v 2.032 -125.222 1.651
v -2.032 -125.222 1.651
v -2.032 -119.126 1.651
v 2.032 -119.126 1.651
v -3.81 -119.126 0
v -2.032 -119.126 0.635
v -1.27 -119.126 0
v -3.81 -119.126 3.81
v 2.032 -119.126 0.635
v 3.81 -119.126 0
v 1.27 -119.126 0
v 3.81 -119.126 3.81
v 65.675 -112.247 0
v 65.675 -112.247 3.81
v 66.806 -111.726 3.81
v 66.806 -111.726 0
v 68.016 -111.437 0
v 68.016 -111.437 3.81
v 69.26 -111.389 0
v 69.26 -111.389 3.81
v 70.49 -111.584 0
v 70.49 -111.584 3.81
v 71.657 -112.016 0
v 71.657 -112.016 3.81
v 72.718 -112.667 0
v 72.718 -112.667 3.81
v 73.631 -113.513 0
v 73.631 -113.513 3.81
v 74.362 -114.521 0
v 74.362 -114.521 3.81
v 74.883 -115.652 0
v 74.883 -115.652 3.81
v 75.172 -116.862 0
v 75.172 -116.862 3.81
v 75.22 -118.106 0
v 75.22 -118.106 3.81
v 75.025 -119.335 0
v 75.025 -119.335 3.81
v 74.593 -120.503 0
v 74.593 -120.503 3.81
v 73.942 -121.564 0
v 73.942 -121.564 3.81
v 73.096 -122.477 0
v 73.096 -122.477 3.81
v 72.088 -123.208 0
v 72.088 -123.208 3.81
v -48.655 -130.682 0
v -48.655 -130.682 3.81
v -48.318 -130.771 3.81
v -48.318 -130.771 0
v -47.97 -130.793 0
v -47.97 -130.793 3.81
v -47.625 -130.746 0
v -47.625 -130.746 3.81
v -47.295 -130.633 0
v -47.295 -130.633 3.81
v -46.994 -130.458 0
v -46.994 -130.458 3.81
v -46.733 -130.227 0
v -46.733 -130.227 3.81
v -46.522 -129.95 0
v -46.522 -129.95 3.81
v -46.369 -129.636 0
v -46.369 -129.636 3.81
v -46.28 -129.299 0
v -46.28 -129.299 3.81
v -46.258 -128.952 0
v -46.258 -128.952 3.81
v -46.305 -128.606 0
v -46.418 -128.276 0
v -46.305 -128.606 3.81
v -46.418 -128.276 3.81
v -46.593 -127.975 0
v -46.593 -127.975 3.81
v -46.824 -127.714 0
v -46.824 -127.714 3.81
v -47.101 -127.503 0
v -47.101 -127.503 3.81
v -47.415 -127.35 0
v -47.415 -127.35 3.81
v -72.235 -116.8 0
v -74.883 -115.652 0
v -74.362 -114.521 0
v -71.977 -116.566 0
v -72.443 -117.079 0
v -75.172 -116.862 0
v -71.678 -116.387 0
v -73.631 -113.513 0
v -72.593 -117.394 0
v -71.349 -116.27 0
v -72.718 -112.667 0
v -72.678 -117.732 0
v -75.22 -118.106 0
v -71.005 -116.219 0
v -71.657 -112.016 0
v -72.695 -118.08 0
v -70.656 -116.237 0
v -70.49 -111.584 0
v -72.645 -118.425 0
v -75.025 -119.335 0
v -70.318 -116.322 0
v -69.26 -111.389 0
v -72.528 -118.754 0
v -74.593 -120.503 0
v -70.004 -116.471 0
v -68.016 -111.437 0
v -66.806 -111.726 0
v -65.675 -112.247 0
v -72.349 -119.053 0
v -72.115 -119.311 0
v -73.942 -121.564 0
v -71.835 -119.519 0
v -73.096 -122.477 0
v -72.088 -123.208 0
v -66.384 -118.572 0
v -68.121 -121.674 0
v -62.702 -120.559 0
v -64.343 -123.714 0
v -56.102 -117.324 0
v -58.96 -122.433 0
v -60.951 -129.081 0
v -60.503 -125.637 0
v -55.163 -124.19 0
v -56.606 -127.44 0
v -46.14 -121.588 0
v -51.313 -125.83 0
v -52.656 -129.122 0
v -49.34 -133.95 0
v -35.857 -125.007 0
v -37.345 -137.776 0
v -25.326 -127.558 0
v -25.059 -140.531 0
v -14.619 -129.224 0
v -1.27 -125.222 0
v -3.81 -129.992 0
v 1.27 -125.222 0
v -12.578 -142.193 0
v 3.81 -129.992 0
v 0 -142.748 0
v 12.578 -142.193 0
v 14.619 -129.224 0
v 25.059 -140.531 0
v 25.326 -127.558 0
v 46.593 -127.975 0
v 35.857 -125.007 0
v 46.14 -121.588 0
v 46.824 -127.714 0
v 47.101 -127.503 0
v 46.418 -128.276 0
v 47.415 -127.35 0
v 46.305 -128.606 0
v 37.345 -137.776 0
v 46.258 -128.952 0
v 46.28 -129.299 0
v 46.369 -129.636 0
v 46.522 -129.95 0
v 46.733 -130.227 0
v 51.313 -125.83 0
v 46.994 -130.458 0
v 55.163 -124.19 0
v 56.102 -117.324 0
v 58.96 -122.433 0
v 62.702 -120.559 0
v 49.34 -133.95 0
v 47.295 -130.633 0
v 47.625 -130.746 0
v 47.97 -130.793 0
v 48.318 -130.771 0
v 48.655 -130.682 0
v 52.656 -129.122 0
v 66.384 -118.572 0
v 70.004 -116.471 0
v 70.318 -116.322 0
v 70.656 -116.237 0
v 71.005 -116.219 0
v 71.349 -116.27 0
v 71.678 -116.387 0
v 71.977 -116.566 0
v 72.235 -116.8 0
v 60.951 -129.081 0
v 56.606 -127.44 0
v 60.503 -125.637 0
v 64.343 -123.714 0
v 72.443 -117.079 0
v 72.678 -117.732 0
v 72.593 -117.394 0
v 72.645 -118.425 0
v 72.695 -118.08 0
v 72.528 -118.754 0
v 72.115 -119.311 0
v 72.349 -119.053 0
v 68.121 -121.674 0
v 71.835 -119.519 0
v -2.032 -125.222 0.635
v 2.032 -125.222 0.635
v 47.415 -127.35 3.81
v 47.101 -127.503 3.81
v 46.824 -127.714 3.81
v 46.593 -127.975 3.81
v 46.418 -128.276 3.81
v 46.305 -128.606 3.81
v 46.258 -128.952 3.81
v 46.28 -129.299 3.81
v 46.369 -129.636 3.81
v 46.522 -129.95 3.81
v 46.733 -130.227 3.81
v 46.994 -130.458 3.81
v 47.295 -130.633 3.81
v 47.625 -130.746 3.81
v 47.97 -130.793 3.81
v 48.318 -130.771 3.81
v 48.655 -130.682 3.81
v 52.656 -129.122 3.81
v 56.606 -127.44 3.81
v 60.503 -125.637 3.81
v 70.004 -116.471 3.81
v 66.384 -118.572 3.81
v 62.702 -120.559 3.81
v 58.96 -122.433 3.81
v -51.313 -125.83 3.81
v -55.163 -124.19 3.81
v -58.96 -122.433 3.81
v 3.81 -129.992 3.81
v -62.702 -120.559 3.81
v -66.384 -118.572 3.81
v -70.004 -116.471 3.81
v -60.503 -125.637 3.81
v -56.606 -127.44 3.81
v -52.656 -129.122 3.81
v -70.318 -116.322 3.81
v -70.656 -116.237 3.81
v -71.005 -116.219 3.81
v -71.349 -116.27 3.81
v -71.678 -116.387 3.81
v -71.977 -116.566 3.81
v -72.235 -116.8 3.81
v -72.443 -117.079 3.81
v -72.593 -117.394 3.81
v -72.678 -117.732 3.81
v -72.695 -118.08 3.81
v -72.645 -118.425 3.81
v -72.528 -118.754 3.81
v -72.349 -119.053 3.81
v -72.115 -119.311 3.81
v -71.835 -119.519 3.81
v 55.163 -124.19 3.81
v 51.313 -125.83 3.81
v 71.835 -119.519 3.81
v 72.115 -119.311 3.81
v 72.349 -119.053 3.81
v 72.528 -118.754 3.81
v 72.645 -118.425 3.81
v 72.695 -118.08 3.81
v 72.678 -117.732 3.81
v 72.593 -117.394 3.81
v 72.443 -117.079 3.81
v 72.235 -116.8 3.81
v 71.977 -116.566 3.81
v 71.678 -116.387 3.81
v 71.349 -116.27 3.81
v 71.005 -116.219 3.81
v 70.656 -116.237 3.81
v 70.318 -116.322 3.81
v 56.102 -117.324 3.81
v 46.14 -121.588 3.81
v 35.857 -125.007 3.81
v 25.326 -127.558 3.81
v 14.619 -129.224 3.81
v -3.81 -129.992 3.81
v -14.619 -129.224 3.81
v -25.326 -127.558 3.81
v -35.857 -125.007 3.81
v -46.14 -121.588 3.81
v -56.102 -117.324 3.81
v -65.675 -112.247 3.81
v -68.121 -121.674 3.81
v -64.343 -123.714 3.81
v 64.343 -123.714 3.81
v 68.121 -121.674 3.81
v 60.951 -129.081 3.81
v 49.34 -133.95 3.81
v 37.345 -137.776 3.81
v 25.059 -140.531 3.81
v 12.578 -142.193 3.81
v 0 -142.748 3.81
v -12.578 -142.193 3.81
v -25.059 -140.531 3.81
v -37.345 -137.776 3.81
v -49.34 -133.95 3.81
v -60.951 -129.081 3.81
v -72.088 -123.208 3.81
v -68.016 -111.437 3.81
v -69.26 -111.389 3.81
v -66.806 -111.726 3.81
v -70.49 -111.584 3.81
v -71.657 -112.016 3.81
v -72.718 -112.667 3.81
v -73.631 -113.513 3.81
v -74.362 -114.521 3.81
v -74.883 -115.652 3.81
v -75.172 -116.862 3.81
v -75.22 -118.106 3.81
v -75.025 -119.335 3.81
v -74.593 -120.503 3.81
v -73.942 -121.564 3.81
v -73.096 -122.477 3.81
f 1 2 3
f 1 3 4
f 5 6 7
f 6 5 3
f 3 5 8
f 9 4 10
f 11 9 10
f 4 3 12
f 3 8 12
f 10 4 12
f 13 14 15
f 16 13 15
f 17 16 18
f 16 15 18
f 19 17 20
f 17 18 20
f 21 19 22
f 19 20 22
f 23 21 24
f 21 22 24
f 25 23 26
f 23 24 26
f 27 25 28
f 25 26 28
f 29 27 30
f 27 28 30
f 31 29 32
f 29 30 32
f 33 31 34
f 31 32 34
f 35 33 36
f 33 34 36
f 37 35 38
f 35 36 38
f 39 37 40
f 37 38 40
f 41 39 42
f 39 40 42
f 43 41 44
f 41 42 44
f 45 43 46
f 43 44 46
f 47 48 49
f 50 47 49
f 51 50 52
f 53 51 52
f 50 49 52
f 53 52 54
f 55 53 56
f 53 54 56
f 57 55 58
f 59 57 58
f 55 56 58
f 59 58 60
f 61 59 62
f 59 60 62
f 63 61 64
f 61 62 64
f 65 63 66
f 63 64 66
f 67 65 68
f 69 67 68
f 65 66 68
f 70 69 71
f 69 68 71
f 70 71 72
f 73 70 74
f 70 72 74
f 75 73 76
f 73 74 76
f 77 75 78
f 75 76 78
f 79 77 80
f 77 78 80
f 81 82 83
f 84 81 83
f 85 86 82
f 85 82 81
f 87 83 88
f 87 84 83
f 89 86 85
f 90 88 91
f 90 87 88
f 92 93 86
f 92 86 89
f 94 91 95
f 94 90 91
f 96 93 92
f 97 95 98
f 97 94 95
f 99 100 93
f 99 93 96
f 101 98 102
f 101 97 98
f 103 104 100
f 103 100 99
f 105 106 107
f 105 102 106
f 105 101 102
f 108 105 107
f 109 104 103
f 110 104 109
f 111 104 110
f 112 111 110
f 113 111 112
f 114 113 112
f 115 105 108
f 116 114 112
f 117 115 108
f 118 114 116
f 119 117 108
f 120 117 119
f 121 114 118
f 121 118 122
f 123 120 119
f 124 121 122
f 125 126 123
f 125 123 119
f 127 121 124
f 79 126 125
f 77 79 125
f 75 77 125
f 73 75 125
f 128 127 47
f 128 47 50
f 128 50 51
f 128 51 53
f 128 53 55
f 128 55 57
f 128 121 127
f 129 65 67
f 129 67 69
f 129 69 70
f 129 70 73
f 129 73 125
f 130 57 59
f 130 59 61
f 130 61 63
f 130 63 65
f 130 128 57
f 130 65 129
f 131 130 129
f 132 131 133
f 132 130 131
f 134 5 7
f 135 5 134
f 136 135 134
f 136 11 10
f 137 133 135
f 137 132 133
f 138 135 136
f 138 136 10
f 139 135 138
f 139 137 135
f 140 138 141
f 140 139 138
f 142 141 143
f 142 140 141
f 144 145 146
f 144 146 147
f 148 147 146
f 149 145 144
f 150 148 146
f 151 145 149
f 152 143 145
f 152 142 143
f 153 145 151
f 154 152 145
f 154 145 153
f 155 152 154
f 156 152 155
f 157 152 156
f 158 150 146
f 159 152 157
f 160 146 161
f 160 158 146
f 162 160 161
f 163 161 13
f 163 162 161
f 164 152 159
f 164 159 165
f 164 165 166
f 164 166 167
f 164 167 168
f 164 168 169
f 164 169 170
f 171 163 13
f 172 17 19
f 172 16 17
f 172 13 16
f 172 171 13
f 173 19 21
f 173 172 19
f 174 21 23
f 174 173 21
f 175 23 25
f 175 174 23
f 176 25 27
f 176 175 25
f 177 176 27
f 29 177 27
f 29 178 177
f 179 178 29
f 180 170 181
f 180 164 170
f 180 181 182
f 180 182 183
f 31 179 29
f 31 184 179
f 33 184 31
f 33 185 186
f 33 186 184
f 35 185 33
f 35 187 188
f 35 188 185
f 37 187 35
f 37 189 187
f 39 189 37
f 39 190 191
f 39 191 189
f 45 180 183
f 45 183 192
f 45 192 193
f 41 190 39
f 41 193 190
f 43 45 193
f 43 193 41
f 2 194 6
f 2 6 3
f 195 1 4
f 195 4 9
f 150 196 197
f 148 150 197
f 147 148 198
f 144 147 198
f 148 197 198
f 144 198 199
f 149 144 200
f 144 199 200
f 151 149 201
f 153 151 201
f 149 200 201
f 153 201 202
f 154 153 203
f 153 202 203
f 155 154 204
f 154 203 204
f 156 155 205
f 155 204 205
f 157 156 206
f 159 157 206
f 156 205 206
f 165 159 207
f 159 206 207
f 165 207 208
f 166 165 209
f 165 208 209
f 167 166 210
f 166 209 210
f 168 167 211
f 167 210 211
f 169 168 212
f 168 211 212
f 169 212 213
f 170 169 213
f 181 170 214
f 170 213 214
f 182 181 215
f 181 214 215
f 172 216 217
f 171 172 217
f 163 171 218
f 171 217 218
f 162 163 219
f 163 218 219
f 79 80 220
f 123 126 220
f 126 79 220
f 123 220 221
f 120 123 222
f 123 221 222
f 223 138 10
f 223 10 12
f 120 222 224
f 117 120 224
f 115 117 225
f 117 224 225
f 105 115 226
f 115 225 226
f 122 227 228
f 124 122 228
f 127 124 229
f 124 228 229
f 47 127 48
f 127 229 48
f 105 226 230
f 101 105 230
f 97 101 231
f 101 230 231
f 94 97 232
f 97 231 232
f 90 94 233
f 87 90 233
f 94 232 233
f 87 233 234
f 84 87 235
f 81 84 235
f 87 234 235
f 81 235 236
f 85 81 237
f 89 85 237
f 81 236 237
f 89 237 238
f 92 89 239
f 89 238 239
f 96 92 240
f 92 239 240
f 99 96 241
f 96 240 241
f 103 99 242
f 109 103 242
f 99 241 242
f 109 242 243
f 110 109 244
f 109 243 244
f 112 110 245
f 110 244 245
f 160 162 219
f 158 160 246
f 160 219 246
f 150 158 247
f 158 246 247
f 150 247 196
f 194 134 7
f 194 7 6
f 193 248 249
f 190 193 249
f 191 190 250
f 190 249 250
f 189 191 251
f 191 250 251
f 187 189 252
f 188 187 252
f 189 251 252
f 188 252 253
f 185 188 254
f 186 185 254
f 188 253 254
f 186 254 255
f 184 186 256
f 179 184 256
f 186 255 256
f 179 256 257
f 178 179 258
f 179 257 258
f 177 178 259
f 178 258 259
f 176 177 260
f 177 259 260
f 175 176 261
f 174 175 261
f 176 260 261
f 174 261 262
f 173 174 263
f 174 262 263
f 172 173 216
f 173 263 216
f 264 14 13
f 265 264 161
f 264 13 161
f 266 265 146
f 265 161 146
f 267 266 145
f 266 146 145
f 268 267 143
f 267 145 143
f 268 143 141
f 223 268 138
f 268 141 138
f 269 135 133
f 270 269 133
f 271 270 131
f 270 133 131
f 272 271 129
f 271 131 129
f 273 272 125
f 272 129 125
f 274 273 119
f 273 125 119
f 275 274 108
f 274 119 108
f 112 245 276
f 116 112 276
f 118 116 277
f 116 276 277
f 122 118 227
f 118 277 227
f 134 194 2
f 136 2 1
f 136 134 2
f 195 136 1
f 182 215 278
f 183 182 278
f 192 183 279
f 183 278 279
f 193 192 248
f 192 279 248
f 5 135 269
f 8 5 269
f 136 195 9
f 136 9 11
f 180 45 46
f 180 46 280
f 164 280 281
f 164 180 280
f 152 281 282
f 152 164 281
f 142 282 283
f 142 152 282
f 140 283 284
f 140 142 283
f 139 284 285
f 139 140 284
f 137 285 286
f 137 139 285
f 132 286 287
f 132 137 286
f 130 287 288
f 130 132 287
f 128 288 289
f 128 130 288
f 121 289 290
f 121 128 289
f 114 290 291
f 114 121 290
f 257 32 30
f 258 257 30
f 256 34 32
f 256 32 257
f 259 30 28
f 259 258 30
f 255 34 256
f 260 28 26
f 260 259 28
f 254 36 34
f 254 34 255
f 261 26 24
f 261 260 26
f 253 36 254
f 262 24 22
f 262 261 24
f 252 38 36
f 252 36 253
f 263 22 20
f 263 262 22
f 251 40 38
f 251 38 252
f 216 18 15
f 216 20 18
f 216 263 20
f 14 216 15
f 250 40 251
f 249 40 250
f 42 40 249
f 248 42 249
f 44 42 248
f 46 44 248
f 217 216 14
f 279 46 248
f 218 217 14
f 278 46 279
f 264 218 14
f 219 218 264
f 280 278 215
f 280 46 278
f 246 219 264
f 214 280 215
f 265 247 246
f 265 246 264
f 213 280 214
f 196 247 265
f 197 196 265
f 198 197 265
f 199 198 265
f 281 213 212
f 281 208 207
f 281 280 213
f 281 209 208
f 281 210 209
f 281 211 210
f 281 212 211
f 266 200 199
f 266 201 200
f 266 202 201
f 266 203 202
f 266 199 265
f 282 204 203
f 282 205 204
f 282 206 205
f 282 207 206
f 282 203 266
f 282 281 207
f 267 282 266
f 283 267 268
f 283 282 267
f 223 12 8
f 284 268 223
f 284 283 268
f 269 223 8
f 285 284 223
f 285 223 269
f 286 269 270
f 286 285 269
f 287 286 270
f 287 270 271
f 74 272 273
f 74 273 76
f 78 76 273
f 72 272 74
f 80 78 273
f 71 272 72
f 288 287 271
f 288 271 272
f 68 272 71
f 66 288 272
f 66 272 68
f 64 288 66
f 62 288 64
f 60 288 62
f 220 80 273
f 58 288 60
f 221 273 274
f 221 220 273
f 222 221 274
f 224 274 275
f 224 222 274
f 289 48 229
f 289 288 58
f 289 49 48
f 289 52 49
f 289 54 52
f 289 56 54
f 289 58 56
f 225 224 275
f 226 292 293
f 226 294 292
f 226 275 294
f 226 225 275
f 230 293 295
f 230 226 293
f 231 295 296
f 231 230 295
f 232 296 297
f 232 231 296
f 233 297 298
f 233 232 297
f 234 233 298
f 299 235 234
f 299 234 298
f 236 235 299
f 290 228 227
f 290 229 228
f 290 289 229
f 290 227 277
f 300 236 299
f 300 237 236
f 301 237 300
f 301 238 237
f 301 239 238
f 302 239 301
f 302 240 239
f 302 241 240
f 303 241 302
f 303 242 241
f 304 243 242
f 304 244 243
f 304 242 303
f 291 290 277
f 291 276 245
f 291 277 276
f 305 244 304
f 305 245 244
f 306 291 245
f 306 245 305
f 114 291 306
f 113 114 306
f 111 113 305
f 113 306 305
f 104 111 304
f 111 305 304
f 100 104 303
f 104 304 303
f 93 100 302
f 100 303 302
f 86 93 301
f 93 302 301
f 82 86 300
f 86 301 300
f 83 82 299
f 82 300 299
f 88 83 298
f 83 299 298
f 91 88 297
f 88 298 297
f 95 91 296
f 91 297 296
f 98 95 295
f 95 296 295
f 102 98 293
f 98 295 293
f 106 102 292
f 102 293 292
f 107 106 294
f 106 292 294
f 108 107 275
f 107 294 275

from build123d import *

# Parameters (mm, degrees)
SKETCH1_W           = 3.81
SKETCH1_H           = 12.7
SKETCH2_R           = 1.778
CUT_EXTRUDE1_DEPTH  = 15.24
SKETCH3_R           = 1.778
CUT_EXTRUDE2_DEPTH  = 4.81
SKETCH6_W           = 7.62
SKETCH6_H           = 3.81
BOSS_EXTRUDE1_DEPTH = 10.922
CUT_EXTRUDE3_DEPTH  = 6.096


with BuildPart() as part:
    # Sketch1 → Revolve1 (revolve)
    with BuildSketch(Plane(origin=(0, 0, 0), x_dir=(0, 0, -1), z_dir=(1, 0, 0)), mode=Mode.PRIVATE) as revolve1_sk:
        with Locations((-1.905, 136.398)):
            Rectangle(SKETCH1_W, SKETCH1_H)
    revolve(revolve1_sk.sketch.rotate(Axis((0, 0, 0), (0, 0, -1)), 90), axis=Axis((0, 0, 0), (0, 0, -1)))  # turned: the seam where the file's is

    # Sketch2 → Cut-Extrude1 (cut, symmetric)
    with BuildSketch(Plane.XY.offset(3.81)):
        with Locations((0, 137.668)):
            Circle(SKETCH2_R)
        with Locations((107.633176528, 85.834594042)):
            Circle(SKETCH2_R)
        with Locations((134.216375814, -30.634011936)):
            Circle(SKETCH2_R)
        with Locations((59.731906597, -124.034582106)):
            Circle(SKETCH2_R)
        with Locations((-59.731906597, -124.034582106)):
            Circle(SKETCH2_R)
        with Locations((-134.216375814, -30.634011936)):
            Circle(SKETCH2_R)
        with Locations((-107.633176528, 85.834594042)):
            Circle(SKETCH2_R)
    extrude(amount=CUT_EXTRUDE1_DEPTH, both=True, mode=Mode.SUBTRACT)

    # Sketch3 → Cut-Extrude2 (cut, through all)
    with BuildSketch(Plane.XY.offset(3.81)):
        with BuildLine():
            ThreePointArc((-70.003567413, -116.471424175), (-72.443427116, -117.079414825), (-71.835436467, -119.519274528))
            ThreePointArc((-71.835436467, -119.519274528), (-66.24004713, -122.708773411), (-60.503351759, -125.636504814))
            ThreePointArc((-60.503351759, -125.636504814), (-61.333829237, -123.263136804), (-58.960461155, -122.432659533))
            ThreePointArc((-58.960461155, -122.432659533), (-64.550865586, -119.579587941), (-70.003567413, -116.471424175))
        make_face()
        with BuildLine():
            ThreePointArc((-57.953906597, -124.034582106), (-58.785953505, -125.540057695), (-60.503351759, -125.636504814))
            ThreePointArc((-60.503351759, -125.636504814), (-54.637588239, -128.296223122), (-48.655269538, -130.68225458))
            ThreePointArc((-48.655269538, -130.68225458), (-46.36863444, -129.636373168), (-47.414515852, -127.34973807))
            ThreePointArc((-47.414515852, -127.34973807), (-53.244279962, -125.024552594), (-58.960461155, -122.432659533))
            ThreePointArc((-58.960461155, -122.432659533), (-58.226430925, -123.088629147), (-57.953906597, -124.034582106))
        make_face()
        with BuildLine():
            ThreePointArc((47.414515852, -127.34973807), (46.36863444, -129.636373168), (48.655269538, -130.68225458))
            ThreePointArc((48.655269538, -130.68225458), (54.637588297, -128.296223097), (60.503351873, -125.636504759))
            ThreePointArc((60.503351873, -125.636504759), (58.129983953, -124.806027402), (58.960461282, -122.432659472))
            ThreePointArc((58.960461282, -122.432659472), (53.244280027, -125.024552566), (47.414515852, -127.34973807))
        make_face()
        with BuildLine():
            ThreePointArc((61.509906597, -124.034582106), (61.23738222, -124.980535144), (60.503351873, -125.636504759))
            ThreePointArc((60.503351873, -125.636504759), (66.240047187, -122.708773381), (71.835436467, -119.519274528))
            ThreePointArc((71.835436467, -119.519274528), (72.443427116, -117.079414825), (70.003567413, -116.471424175))
            ThreePointArc((70.003567413, -116.471424175), (64.550865648, -119.579587907), (58.960461282, -122.432659472))
            ThreePointArc((58.960461282, -122.432659472), (60.677859616, -122.529106472), (61.509906597, -124.034582106))
        make_face()
        with BuildLine():
            ThreePointArc((-72.088346147, -123.208205302), (-74.362361234, -114.520636287), (-65.67479222, -112.2466212))
            ThreePointArc((-65.67479222, -112.2466212), (-64.697785609, 112.812582815), (130.048, 0))
            ThreePointArc((130.048, 0), (112.812582815, -64.697785609), (65.67479222, -112.2466212))
            ThreePointArc((65.67479222, -112.2466212), (74.362361234, -114.520636287), (72.088346147, -123.208205302))
            ThreePointArc((72.088346147, -123.208205302), (123.829436605, -71.015928735), (142.748, 0))
            ThreePointArc((142.748, 0), (-71.015928735, 123.829436605), (-72.088346147, -123.208205302))
        make_face()
        with Locations((-134.216375814, -30.634011936)):
            Circle(SKETCH3_R, mode=Mode.SUBTRACT)
        with Locations((134.216375814, -30.634011936)):
            Circle(SKETCH3_R, mode=Mode.SUBTRACT)
        with Locations((-107.633176528, 85.834594042)):
            Circle(SKETCH3_R, mode=Mode.SUBTRACT)
        with Locations((0, 137.668)):
            Circle(SKETCH3_R, mode=Mode.SUBTRACT)
        with Locations((107.633176528, 85.834594042)):
            Circle(SKETCH3_R, mode=Mode.SUBTRACT)
    extrude(amount=-CUT_EXTRUDE2_DEPTH, mode=Mode.SUBTRACT)

    # Sketch6 → Boss-Extrude1 (add)
    with BuildSketch(Plane.XZ.offset(130.048)):
        with Locations((0, 1.905)):
            Rectangle(SKETCH6_W, SKETCH6_H)
    extrude(amount=-BOSS_EXTRUDE1_DEPTH)

    # Sketch7 → Cut-Extrude3 (cut)
    with BuildSketch(Plane(origin=(0, -119.126, 0), x_dir=(1, 0, 0), z_dir=(0, 1, 0))):
        Polygon((-1.27, 0), (-2.032, -0.635), (-2.032, -1.651), (2.032, -1.651), (2.032, -0.635), (1.27, 0), align=None)
    extrude(amount=-CUT_EXTRUDE3_DEPTH, mode=Mode.SUBTRACT)


solid = part.part
